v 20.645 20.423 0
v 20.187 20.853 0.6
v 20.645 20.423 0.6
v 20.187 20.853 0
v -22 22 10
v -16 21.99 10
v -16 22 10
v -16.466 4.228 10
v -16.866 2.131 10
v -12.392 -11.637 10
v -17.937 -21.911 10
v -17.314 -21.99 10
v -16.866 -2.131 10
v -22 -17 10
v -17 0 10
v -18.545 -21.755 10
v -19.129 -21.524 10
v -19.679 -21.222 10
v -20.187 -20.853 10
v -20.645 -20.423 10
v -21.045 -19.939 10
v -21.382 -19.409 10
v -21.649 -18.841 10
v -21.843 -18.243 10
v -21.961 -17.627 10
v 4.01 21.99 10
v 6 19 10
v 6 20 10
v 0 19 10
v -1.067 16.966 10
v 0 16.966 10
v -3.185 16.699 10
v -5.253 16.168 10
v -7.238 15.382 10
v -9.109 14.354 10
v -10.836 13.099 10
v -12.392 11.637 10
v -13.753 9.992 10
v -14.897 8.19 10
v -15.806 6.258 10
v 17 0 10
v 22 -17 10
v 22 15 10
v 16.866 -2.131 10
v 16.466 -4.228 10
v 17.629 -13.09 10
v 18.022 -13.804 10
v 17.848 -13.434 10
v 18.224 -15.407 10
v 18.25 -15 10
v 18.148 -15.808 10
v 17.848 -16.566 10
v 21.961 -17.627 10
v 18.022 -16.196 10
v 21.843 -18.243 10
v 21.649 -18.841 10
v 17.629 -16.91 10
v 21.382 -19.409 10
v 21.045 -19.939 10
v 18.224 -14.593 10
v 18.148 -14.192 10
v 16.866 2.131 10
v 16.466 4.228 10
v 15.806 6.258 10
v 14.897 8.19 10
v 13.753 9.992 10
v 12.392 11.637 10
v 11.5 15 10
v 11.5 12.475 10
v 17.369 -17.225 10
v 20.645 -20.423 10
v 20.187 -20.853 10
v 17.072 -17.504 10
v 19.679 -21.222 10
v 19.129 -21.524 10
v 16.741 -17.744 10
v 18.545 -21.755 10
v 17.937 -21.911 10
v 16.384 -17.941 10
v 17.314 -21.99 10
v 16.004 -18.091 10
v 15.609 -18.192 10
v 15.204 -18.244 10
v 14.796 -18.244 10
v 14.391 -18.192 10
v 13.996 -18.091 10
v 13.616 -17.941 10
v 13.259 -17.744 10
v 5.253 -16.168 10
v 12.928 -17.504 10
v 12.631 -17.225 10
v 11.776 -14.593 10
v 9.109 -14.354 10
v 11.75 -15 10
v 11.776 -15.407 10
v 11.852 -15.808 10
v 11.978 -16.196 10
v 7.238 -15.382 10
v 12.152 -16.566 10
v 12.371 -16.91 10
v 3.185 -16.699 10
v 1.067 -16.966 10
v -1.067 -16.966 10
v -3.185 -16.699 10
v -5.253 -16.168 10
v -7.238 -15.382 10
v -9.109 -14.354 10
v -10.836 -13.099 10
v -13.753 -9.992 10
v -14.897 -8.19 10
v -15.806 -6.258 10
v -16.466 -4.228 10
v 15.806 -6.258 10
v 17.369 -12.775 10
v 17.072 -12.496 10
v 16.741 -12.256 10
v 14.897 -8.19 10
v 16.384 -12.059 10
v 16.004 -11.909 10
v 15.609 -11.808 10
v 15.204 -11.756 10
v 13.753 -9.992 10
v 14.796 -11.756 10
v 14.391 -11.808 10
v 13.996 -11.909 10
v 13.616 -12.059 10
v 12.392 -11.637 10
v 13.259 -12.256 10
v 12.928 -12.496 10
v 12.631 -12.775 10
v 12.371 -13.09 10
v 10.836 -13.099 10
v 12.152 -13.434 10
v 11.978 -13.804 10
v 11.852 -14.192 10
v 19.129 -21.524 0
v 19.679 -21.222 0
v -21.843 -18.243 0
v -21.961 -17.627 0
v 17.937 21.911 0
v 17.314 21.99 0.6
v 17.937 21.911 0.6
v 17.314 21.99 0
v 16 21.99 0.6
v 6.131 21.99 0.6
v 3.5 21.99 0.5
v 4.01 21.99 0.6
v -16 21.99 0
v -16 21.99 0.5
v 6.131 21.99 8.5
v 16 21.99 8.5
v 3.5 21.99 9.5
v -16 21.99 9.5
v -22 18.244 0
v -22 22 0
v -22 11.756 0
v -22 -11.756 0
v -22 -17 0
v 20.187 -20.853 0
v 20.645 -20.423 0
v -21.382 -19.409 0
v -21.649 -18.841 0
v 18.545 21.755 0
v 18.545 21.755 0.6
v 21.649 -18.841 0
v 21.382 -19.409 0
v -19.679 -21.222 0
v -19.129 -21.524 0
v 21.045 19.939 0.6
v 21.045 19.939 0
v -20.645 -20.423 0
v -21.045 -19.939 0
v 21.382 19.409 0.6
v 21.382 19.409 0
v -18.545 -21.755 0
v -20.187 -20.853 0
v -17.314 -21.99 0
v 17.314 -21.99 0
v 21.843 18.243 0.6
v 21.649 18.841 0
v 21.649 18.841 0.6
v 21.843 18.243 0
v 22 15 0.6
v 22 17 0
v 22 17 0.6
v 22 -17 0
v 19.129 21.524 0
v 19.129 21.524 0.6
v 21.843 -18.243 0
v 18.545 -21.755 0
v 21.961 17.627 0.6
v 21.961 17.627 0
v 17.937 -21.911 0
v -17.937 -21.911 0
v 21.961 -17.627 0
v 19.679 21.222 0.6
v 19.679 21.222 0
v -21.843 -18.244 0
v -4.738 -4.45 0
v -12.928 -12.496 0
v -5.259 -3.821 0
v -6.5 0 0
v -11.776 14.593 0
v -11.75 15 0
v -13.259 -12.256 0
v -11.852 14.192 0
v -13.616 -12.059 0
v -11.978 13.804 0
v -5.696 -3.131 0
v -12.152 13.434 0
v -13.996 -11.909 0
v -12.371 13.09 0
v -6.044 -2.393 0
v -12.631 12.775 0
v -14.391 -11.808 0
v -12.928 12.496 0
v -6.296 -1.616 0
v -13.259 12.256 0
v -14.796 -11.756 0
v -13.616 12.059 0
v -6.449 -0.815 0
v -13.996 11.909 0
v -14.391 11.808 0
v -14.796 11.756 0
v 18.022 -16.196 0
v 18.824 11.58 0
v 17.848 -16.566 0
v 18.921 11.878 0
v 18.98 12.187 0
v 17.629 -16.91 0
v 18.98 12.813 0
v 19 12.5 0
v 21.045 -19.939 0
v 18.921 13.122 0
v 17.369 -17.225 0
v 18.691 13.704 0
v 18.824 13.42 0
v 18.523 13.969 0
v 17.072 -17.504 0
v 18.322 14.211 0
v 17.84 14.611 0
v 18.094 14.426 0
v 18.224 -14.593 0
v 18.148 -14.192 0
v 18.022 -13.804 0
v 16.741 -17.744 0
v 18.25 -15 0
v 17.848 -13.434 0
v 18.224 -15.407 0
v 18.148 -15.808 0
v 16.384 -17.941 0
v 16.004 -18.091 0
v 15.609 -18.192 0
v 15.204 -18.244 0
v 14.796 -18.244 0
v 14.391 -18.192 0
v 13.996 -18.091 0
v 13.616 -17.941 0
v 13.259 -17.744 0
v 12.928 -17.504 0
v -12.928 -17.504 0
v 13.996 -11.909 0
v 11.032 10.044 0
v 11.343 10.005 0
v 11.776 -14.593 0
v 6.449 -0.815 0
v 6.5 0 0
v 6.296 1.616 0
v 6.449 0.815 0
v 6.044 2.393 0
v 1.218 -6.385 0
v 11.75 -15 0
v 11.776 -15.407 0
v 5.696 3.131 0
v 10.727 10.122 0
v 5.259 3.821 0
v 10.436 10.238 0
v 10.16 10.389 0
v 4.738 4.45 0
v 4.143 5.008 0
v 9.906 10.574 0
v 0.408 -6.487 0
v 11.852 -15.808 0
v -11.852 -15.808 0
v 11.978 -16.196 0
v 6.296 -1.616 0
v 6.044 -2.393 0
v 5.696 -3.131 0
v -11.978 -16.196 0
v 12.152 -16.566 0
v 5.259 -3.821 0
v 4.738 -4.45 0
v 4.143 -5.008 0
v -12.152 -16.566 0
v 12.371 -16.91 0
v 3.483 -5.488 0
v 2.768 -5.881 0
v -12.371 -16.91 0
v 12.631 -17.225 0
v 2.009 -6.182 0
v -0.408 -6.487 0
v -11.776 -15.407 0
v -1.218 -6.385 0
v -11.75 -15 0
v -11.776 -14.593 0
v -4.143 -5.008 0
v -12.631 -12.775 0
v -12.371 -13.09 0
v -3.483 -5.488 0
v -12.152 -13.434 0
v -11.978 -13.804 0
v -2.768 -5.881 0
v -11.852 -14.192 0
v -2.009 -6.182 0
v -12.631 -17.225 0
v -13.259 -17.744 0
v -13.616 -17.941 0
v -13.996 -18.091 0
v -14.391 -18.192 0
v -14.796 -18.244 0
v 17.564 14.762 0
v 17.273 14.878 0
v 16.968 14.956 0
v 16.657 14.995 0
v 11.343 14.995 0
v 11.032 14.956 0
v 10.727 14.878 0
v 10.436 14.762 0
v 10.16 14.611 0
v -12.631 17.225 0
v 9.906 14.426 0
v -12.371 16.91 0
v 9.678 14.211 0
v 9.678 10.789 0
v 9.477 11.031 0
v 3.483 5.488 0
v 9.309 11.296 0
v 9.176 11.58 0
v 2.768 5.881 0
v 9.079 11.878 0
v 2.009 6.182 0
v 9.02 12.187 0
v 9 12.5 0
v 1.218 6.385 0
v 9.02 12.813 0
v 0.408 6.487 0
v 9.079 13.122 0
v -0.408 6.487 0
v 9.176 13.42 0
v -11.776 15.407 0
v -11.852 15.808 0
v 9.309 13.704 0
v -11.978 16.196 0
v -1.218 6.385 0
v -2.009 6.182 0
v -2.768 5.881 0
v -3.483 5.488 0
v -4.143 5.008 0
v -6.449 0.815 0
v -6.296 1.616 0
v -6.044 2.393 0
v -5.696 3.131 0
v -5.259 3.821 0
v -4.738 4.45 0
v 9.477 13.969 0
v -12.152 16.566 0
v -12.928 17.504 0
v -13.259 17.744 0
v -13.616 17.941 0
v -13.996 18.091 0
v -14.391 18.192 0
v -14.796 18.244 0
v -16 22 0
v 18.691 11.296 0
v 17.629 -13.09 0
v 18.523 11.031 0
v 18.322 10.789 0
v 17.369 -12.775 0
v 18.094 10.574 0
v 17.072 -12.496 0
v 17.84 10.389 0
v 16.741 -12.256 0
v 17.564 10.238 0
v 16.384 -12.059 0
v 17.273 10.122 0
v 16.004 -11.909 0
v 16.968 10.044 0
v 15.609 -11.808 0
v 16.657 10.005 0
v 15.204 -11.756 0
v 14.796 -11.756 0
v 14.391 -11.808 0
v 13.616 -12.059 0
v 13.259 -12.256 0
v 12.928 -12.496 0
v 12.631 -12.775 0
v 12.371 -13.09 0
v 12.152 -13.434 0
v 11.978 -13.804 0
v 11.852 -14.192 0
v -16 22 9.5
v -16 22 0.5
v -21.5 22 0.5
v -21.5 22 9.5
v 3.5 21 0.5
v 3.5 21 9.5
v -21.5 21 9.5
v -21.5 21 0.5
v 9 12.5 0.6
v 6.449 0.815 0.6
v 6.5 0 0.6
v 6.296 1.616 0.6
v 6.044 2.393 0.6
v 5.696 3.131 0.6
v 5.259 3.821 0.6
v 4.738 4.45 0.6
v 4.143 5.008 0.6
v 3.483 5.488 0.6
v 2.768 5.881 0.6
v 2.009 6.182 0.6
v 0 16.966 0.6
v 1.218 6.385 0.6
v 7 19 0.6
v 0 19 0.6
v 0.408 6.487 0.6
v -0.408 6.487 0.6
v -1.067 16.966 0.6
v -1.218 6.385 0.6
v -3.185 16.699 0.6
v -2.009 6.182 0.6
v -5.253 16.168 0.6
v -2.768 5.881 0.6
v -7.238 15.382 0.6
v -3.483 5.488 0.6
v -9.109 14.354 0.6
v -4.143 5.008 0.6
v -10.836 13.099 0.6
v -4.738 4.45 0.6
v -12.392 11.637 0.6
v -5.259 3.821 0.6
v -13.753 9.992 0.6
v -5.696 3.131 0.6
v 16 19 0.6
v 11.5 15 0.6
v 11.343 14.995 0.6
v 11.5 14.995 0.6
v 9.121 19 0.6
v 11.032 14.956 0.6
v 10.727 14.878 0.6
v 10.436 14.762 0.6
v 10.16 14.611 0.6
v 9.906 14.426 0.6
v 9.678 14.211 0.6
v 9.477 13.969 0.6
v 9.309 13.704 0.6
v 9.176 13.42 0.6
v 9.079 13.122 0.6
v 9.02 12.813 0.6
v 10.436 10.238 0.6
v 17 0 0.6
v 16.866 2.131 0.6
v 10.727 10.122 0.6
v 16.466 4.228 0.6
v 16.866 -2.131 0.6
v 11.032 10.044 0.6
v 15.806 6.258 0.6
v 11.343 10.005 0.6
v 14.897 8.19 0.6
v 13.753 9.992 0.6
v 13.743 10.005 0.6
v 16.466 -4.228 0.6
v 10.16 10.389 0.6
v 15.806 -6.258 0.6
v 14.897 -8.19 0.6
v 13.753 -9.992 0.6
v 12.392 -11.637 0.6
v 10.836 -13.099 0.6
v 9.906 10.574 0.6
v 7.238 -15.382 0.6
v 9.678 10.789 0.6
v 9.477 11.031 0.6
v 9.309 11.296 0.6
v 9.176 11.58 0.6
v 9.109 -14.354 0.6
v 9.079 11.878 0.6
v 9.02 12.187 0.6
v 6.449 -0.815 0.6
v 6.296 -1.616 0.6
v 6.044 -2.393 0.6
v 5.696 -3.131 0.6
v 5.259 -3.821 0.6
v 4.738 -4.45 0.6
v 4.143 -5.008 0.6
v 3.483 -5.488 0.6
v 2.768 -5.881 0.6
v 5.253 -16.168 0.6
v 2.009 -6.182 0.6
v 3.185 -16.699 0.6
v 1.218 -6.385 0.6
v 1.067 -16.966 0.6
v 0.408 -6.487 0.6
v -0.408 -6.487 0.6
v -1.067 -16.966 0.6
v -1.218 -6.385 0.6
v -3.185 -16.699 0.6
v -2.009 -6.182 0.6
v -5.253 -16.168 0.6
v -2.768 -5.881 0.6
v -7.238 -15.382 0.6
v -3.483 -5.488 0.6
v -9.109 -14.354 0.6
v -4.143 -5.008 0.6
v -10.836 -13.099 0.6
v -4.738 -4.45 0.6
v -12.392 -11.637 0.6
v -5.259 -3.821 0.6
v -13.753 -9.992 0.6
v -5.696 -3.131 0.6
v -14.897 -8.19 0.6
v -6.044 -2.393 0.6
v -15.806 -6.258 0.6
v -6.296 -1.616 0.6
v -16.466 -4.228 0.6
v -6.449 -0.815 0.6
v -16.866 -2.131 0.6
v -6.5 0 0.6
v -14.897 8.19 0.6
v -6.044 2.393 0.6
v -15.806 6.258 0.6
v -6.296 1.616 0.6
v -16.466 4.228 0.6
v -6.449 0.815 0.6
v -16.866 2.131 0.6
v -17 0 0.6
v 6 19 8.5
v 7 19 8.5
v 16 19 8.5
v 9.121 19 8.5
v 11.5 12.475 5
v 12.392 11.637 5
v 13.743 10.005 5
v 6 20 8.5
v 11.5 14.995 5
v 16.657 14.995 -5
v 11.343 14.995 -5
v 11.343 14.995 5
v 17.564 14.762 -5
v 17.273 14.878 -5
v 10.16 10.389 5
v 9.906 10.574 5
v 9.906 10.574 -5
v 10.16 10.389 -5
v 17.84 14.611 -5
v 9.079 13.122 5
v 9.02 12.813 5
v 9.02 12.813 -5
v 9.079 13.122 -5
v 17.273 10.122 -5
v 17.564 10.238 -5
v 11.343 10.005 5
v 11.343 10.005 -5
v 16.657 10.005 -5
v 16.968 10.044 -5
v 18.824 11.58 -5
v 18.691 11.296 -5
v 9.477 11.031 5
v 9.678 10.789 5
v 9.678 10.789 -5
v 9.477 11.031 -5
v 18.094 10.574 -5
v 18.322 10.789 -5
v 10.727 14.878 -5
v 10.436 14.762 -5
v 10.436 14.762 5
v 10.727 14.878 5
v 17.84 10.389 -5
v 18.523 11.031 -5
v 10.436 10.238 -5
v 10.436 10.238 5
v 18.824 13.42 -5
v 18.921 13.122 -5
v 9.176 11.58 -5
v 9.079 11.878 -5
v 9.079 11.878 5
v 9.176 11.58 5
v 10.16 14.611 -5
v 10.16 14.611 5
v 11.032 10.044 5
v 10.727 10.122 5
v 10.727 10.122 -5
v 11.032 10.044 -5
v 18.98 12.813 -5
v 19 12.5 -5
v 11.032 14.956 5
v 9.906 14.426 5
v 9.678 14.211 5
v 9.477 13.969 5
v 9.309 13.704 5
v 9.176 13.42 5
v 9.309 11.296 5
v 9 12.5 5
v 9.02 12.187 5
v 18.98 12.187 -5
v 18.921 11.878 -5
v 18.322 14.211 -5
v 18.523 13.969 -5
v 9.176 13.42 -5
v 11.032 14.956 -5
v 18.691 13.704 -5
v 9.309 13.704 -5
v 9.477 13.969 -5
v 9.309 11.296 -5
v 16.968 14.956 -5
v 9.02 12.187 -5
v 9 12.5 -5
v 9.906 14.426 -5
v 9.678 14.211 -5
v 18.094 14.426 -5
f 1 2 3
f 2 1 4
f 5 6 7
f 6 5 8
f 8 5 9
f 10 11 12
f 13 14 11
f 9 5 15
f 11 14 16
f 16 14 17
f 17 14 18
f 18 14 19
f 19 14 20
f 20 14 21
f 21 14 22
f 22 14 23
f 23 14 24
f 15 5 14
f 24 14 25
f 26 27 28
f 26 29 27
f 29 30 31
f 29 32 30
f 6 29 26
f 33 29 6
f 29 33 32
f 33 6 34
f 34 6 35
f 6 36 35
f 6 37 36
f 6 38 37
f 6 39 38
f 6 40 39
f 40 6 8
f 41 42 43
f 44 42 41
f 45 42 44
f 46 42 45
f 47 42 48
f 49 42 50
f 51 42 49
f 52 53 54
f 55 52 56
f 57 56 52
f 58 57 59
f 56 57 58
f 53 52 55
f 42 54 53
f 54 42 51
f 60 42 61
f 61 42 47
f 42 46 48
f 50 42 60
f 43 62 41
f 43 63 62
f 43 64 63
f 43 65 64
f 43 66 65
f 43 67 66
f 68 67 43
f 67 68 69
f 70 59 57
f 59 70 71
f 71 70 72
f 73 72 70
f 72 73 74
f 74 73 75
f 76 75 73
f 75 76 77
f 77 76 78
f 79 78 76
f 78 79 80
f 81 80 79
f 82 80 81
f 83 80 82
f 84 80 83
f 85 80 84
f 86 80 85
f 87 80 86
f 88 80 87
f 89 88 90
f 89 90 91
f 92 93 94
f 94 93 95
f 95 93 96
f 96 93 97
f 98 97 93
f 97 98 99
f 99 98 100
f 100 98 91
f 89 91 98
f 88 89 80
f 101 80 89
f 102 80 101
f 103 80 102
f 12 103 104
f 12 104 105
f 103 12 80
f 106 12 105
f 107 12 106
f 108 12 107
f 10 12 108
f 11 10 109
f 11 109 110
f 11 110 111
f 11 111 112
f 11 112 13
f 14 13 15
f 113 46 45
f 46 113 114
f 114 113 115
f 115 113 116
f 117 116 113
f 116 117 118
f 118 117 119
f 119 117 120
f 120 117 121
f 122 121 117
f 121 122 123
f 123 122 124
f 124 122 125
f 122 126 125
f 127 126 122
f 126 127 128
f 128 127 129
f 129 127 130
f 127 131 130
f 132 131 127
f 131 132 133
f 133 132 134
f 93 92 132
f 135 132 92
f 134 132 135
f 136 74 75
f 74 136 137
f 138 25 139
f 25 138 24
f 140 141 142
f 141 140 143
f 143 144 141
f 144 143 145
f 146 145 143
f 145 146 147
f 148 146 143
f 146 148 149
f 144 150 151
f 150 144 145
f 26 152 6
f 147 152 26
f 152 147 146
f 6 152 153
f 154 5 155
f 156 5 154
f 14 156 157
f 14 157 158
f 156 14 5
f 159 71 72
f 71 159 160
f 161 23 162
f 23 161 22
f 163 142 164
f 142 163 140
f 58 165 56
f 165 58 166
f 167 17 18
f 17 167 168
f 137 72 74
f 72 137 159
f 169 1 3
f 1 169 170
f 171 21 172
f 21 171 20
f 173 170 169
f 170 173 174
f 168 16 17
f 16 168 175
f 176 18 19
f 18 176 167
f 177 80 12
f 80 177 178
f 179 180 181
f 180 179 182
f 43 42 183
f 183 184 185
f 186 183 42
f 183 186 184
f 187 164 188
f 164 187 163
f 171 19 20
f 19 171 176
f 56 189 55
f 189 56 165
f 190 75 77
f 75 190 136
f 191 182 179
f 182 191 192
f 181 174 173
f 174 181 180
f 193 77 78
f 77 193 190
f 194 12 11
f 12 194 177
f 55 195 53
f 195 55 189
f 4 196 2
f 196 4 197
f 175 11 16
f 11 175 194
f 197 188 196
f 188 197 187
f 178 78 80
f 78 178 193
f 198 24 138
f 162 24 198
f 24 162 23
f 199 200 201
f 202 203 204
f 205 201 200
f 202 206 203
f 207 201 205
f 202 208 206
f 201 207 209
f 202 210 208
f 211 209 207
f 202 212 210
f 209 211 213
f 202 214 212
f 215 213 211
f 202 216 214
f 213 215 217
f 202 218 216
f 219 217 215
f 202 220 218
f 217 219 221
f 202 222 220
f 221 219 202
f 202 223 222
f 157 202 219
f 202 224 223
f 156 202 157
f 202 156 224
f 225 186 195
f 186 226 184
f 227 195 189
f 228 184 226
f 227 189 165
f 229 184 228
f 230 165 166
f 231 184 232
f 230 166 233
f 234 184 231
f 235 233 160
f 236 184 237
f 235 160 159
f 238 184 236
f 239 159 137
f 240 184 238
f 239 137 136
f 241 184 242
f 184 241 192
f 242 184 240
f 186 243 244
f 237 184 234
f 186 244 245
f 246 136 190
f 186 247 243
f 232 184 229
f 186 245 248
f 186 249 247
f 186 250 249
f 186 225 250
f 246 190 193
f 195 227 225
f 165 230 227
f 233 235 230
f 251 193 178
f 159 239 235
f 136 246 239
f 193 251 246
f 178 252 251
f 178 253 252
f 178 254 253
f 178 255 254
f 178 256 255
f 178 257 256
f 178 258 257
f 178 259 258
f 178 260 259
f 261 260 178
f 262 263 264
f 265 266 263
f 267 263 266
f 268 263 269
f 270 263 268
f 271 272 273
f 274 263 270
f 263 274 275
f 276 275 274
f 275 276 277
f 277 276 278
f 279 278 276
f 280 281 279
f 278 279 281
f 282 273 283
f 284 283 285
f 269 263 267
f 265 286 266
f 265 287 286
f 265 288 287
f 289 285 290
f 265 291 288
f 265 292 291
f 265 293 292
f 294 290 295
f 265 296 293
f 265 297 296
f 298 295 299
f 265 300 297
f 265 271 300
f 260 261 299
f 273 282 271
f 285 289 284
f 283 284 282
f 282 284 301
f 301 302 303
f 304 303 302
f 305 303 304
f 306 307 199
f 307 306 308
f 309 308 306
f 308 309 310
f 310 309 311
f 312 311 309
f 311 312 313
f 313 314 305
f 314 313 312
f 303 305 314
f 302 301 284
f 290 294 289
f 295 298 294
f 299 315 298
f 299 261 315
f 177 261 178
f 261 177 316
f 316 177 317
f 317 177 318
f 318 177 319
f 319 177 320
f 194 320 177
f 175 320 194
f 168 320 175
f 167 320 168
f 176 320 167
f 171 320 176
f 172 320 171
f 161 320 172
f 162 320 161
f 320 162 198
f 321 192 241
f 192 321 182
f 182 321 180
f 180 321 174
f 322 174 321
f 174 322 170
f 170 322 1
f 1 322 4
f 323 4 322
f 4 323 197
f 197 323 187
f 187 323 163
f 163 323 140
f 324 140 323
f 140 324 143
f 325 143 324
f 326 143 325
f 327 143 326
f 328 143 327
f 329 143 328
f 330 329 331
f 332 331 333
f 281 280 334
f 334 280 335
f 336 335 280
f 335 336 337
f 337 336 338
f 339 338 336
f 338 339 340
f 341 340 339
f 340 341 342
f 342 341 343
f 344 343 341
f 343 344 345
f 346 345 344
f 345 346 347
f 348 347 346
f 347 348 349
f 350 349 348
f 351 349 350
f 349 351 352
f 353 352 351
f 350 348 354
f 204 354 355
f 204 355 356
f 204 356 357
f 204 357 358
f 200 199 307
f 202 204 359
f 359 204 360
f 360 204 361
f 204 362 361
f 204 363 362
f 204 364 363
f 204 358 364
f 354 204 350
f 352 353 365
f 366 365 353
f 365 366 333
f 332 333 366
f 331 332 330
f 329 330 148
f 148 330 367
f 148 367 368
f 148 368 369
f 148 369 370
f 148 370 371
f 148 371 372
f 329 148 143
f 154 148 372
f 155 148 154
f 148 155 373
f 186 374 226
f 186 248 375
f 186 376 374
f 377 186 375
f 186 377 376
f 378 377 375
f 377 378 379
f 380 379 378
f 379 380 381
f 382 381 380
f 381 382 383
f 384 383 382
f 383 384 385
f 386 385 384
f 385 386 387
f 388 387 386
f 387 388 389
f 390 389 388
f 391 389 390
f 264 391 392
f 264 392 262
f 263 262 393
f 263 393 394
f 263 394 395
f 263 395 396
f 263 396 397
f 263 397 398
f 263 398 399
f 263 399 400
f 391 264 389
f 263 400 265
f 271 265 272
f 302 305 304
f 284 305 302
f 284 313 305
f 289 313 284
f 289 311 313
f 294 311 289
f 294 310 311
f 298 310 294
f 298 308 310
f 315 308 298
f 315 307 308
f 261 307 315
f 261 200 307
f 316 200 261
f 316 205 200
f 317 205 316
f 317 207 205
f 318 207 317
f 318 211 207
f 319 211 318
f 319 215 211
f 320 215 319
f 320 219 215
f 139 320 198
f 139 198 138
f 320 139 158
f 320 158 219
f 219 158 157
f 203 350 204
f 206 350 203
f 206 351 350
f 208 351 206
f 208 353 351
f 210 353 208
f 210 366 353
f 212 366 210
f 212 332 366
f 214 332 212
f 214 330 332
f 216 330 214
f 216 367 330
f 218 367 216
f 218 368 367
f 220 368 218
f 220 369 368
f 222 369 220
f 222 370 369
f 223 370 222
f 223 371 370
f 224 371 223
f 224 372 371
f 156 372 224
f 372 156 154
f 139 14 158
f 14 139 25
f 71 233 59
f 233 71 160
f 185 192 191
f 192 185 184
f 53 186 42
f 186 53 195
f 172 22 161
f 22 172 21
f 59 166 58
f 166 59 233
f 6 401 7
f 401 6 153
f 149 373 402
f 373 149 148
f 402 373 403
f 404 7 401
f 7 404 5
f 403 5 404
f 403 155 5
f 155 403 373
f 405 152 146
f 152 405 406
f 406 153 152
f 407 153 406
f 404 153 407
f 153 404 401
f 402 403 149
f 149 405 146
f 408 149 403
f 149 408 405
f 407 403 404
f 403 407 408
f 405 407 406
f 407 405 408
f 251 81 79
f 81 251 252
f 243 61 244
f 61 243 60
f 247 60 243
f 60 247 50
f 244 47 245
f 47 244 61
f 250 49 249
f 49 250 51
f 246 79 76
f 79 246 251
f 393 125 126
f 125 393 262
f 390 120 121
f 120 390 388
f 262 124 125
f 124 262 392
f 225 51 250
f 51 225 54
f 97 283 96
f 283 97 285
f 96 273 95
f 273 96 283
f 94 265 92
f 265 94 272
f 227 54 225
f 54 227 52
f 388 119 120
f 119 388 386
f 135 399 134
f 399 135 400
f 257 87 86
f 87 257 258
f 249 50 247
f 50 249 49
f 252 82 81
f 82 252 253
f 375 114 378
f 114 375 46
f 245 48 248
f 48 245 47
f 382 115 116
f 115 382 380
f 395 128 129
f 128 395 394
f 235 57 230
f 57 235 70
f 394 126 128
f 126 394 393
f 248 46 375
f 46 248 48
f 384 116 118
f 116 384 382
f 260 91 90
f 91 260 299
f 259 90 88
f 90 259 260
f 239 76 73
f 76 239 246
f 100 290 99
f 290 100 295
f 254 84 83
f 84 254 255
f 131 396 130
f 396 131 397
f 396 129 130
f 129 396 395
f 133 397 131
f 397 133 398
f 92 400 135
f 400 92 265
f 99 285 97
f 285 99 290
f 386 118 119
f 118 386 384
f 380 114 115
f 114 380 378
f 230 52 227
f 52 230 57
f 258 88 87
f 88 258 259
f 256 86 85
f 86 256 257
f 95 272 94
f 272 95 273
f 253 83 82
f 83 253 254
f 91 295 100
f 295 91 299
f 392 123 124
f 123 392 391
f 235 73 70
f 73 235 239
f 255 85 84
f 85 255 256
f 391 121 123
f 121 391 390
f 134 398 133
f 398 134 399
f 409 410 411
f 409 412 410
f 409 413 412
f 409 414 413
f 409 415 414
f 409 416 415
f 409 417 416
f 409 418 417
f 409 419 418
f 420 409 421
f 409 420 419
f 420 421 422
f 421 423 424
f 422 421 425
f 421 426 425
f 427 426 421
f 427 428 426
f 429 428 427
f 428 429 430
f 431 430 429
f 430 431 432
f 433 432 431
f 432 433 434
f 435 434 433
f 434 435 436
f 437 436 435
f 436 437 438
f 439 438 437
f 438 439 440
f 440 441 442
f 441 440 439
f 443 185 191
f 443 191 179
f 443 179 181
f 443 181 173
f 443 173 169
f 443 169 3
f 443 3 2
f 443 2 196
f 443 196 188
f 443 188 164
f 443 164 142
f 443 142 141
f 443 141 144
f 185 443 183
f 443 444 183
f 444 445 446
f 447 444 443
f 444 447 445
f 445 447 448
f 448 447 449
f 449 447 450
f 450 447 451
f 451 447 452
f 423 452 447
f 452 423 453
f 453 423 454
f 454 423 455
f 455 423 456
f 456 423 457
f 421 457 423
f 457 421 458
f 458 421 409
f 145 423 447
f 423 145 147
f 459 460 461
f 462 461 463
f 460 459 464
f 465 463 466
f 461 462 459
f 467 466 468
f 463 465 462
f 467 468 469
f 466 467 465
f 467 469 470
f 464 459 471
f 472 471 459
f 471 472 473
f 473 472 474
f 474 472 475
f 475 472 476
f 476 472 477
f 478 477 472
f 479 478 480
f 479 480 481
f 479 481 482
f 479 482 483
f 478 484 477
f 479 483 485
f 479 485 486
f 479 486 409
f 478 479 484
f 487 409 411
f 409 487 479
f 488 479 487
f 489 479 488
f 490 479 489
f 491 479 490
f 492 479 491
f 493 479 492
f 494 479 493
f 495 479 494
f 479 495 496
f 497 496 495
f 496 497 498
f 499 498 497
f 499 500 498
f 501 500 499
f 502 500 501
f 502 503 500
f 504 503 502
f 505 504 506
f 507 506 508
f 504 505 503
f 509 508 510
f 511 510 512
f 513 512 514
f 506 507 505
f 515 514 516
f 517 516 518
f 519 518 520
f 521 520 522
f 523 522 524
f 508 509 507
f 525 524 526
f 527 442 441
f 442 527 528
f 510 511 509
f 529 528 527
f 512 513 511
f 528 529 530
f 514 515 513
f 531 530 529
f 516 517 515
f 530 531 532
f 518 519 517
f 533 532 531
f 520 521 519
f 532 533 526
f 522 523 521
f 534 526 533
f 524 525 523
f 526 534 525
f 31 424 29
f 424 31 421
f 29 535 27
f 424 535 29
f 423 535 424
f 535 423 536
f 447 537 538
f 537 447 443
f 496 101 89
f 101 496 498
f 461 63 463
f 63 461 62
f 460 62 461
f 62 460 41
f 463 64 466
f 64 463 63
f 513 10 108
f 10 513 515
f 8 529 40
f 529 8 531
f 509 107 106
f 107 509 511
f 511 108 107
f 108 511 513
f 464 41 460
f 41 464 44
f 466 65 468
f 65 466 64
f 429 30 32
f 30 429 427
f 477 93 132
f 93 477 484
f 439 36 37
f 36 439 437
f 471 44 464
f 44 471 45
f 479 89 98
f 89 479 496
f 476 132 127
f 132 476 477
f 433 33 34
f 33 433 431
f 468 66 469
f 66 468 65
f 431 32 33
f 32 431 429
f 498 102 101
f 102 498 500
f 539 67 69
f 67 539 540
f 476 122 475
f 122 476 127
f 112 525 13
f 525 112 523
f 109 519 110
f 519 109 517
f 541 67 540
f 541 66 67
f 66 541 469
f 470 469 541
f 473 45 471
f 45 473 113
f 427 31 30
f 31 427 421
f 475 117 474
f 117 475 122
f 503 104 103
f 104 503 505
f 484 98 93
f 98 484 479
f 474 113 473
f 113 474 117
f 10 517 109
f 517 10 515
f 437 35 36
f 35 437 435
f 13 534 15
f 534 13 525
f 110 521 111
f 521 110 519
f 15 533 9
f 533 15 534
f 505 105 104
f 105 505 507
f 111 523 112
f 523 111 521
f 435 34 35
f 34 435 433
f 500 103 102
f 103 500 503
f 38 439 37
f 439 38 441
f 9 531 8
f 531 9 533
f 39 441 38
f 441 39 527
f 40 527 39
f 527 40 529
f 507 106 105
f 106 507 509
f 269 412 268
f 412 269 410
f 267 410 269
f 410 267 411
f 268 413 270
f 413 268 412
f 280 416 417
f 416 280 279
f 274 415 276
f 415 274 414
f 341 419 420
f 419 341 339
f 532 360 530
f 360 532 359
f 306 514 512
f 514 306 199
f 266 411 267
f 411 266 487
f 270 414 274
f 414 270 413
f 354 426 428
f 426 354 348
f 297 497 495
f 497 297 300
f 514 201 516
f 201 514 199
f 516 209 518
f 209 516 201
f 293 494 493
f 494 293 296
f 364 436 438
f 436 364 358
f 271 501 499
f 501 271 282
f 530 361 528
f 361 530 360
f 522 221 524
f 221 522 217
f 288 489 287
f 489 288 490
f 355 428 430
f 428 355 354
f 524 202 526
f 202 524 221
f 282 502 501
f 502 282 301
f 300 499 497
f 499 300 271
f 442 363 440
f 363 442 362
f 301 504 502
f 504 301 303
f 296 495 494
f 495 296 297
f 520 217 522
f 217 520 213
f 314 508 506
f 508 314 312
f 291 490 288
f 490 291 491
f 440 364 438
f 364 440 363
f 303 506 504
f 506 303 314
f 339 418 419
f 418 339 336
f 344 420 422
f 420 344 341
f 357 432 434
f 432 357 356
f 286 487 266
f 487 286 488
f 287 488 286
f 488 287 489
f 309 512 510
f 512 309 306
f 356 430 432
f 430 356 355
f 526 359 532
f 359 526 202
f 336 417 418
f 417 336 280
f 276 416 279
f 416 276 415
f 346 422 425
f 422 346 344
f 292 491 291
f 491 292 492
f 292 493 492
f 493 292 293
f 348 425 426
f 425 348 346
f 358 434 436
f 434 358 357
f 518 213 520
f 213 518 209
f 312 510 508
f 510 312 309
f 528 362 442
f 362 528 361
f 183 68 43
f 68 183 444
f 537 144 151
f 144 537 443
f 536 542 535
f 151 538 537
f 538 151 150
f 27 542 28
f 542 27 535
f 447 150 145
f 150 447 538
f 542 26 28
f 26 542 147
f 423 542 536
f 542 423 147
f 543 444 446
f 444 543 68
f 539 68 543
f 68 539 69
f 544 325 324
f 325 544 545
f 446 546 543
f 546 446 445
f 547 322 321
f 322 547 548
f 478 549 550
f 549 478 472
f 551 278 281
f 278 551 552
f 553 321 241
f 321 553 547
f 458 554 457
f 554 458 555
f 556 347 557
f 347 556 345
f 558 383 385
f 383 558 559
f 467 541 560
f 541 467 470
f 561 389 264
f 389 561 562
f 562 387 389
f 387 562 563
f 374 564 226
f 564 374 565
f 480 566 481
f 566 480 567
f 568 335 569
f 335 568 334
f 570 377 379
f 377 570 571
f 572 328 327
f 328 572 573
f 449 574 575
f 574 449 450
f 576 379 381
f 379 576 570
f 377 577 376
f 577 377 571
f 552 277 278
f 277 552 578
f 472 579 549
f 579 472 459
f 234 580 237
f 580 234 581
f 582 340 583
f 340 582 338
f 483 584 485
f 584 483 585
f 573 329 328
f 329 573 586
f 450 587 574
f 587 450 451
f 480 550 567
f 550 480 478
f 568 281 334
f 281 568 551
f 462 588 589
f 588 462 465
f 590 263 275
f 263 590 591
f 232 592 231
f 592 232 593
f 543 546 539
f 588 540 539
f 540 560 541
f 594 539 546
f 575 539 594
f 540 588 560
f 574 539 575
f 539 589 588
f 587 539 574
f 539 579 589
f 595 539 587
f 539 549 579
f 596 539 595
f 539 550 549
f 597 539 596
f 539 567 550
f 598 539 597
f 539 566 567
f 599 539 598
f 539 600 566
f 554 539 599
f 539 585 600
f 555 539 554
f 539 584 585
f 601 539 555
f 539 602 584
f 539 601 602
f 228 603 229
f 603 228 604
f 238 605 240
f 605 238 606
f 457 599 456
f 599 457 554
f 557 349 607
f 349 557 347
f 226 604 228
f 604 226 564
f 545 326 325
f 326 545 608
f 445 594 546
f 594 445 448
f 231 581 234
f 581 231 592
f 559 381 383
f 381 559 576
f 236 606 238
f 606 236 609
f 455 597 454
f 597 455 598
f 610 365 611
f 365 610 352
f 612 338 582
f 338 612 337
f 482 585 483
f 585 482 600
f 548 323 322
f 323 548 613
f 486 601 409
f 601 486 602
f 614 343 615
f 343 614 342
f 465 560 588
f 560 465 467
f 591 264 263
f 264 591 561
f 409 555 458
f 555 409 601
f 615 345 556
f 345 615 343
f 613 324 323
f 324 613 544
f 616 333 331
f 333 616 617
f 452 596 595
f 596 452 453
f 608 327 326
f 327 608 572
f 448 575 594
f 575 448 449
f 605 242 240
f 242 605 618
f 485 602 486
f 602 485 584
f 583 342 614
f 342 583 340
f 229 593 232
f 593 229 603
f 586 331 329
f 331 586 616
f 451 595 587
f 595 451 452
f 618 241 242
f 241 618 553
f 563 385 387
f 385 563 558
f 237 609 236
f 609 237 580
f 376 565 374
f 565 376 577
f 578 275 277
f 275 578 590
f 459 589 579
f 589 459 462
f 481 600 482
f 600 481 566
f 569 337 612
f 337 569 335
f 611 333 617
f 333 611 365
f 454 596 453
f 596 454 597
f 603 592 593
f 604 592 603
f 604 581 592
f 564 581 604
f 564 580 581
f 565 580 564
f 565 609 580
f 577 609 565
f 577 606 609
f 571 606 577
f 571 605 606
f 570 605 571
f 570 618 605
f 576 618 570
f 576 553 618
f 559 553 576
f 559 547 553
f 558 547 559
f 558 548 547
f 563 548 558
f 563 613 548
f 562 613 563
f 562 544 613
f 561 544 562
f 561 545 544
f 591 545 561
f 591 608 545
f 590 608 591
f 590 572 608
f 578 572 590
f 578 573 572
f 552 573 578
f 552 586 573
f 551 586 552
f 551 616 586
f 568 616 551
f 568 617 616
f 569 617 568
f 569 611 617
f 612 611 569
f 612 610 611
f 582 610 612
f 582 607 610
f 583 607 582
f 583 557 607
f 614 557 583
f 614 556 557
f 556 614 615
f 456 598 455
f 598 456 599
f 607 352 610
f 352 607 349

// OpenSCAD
$fn = 50;


union() {
	difference() {
		union() {
			hull() {
				translate(v = [-17.0000000000, 17.0000000000, 0]) {
					cylinder(h = 10, r = 5);
				}
				translate(v = [17.0000000000, 17.0000000000, 0]) {
					cylinder(h = 10, r = 5);
				}
				translate(v = [-17.0000000000, -17.0000000000, 0]) {
					cylinder(h = 10, r = 5);
				}
				translate(v = [17.0000000000, -17.0000000000, 0]) {
					cylinder(h = 10, r = 5);
				}
			}
			translate(v = [-22.0000000000, 16.0000000000, 0]) {
				cube(size = [6, 6, 10]);
			}
		}
		union() {
			translate(v = [-22.5000000000, -15.0000000000, -250.0000000000]) {
				rotate(a = [0, 0, 0]) {
					difference() {
						union() {
							hull() {
								translate(v = [7.5000000000, 0, 0]) {
									cylinder(h = 250, r = 3.2500000000, r1 = 3.2500000000, r2 = 3.2500000000);
								}
								translate(v = [-7.5000000000, 0, 0]) {
									cylinder(h = 250, r = 3.2500000000, r1 = 3.2500000000, r2 = 3.2500000000);
								}
							}
						}
						union();
					}
				}
			}
			translate(v = [-22.5000000000, 15.0000000000, -250.0000000000]) {
				rotate(a = [0, 0, 0]) {
					difference() {
						union() {
							hull() {
								translate(v = [7.5000000000, 0, 0]) {
									cylinder(h = 250, r = 3.2500000000, r1 = 3.2500000000, r2 = 3.2500000000);
								}
								translate(v = [-7.5000000000, 0, 0]) {
									cylinder(h = 250, r = 3.2500000000, r1 = 3.2500000000, r2 = 3.2500000000);
								}
							}
						}
						union();
					}
				}
			}
			translate(v = [-21.5000000000, 21.0000000000, 0.5000000000]) {
				cube(size = [25, 1, 9.0000000000]);
			}
			translate(v = [15.0000000000, -15.0000000000, 0]) {
				cylinder(h = 100, r = 3.2500000000);
			}
			translate(v = [0.0000000000, 11.0000000000, 0.6000000000]) {
				cube(size = [11, 8, 12.4000000000]);
			}
			translate(v = [0, 0, 0.6000000000]) {
				cylinder(h = 12.4000000000, r = 17.0000000000);
			}
			translate(v = [0, 0, -5.0000000000]) {
				cylinder(h = 10, r = 6.5000000000);
			}
			translate(v = [0.0000000000, 15.0000000000, 0.6000000000]) {
				cube(size = [22.0000000000, 4, 12.4000000000]);
			}
			translate(v = [16.0000000000, 15.0000000000, 0.6000000000]) {
				cube(size = [6, 7, 12.4000000000]);
			}
			translate(v = [6.0000000000, 15.0000000000, 8.5000000000]) {
				cube(size = [16, 7, 1.5000000000]);
			}
			translate(v = [3.2500000000, 22.7500000000, 0.6000000000]) {
				rotate(a = [0, 0, -45]) {
					cube(size = [7.5000000000, 1.5000000000, 12.4000000000]);
				}
			}
			translate(v = [2.5000000000, 10.0000000000, 0.6000000000]) {
				cube(size = [9.0000000000, 5, 9.4000000000]);
			}
		}
	}
	union() {
		translate(v = [14, 12.5000000000, -5.0000000000]) {
			rotate(a = [0, 0, 0]) {
				difference() {
					union() {
						#hull() {
							#translate(v = [2.5000000000, 0, 0]) {
								cylinder(h = 10, r = 2.5000000000, r1 = 2.5000000000, r2 = 2.5000000000);
							}
							#translate(v = [-2.5000000000, 0, 0]) {
								cylinder(h = 10, r = 2.5000000000, r1 = 2.5000000000, r2 = 2.5000000000);
							}
						}
					}
					union();
				}
			}
		}
	}
}
